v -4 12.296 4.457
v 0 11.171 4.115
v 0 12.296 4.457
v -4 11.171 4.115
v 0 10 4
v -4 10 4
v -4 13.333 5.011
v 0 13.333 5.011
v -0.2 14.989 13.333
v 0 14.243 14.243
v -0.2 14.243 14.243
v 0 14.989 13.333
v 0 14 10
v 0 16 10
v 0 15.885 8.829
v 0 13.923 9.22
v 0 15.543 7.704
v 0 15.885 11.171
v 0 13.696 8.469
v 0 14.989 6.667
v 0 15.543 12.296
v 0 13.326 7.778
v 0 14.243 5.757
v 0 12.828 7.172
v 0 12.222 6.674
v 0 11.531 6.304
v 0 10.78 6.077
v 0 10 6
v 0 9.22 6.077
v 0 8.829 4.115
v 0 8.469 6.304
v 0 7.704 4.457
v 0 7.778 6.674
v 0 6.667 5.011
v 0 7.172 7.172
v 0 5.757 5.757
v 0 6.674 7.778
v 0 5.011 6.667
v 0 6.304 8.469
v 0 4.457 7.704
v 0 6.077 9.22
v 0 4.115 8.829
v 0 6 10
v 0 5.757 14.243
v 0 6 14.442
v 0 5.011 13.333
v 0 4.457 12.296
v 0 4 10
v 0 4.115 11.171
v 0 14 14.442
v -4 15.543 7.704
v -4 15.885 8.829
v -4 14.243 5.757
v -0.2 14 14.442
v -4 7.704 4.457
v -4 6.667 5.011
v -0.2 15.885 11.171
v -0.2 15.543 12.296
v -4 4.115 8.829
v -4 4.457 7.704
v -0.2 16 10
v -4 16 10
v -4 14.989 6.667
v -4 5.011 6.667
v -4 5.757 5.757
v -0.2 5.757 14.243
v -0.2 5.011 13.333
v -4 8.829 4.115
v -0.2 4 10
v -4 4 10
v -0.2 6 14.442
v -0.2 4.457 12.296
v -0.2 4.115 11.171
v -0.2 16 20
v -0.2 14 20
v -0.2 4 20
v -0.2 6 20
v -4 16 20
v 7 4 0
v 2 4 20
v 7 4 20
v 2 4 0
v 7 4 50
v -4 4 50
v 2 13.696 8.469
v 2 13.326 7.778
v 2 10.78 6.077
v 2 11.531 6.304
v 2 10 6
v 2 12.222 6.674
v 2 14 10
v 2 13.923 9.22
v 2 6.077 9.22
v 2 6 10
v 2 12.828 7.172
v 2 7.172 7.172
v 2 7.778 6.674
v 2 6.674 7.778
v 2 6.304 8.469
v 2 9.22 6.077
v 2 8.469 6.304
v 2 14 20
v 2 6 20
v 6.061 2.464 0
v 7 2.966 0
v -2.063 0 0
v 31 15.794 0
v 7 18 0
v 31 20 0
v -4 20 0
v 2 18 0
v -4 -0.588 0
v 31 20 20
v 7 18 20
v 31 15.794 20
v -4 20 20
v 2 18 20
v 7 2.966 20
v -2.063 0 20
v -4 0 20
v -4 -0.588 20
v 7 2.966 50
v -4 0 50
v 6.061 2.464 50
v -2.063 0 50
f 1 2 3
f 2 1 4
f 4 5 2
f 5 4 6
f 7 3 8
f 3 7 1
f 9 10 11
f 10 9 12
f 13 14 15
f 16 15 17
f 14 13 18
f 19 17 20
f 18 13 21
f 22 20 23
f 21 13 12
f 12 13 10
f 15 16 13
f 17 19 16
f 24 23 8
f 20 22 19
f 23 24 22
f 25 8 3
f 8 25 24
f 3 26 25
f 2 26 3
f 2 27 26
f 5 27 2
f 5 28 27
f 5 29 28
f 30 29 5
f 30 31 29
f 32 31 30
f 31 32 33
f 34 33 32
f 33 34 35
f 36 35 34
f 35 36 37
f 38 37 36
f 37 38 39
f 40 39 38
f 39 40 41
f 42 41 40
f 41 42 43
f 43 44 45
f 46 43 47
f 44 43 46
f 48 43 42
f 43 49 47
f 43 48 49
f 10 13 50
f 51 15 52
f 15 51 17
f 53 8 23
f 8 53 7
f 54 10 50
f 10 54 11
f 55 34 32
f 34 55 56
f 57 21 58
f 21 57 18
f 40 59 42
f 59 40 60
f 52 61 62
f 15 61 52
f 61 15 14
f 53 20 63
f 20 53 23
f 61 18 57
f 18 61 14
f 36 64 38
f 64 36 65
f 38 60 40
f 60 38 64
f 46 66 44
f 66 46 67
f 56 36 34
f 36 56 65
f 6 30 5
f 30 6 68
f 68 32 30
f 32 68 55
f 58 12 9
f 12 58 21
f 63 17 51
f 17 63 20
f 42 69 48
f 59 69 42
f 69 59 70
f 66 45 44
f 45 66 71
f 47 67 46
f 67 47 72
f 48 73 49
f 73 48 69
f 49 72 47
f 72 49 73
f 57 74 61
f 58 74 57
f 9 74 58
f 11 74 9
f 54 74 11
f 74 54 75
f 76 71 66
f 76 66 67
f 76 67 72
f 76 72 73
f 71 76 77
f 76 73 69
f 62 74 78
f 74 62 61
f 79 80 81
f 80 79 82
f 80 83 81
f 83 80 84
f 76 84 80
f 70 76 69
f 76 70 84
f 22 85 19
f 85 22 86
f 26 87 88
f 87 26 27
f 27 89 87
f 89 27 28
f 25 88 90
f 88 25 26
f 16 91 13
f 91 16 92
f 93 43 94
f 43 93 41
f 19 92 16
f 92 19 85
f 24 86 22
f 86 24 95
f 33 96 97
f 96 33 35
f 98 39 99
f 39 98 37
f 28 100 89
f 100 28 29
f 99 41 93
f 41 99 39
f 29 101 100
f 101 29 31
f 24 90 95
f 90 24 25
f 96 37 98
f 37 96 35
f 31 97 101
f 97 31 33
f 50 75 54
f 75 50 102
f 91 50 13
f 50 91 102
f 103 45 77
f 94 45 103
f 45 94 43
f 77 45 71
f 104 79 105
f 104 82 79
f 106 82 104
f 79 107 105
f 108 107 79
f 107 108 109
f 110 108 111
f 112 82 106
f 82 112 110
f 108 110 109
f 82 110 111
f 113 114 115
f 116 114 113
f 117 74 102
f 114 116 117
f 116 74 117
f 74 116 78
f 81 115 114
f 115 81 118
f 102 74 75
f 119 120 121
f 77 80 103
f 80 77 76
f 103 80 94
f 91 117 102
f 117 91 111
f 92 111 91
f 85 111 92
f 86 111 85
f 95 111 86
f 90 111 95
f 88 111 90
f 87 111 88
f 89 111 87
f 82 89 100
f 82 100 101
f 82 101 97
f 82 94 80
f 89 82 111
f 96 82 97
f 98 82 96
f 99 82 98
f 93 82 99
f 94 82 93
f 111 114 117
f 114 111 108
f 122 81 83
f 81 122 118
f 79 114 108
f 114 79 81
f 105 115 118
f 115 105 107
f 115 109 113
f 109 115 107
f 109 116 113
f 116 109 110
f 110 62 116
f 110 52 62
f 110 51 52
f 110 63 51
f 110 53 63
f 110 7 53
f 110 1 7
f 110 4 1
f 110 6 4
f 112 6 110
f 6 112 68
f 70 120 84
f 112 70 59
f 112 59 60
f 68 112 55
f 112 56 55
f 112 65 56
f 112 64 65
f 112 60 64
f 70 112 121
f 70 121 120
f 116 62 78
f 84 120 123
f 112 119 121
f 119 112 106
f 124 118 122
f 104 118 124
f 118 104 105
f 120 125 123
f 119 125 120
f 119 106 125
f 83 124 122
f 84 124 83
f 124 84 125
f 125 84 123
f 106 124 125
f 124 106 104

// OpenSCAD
// file: bumper_spring_block_base.scad
include <generic/lib.scad>;

use <chassis_base.scad>;

kChassisBaseDatasheet = vChassisBaseDatasheet();

function vBumperSpringBlockBaseDatasheet() =
     let(thickness=property(kChassisBaseDatasheet, "thickness"),
         seat_thickness=3 * thickness, slot_width=5, spring_travel_distance=5,
         spring_max_length=spring_travel_distance + slot_width + 2 * seat_thickness)
     [["height", 20], ["width", 20], ["depth", 35], ["thickness", thickness], ["angular_offset", 70],
      ["spring_outer_diameter", 12], ["spring_inner_diameter", 8], ["spring_lock_size", 2 * thickness],
      ["spring_seat_thickness", seat_thickness], ["spring_slot_width", slot_width],
      ["spring_travel_distance", spring_travel_distance],
      ["spring_max_length", spring_max_length]];


module mBumperSpringBlockSeatComplement() {
     datasheet = vBumperSpringBlockBaseDatasheet();
     height = property(datasheet, "height");
     width = property(datasheet, "width");
     depth = property(datasheet, "depth");
     thickness = property(datasheet, "thickness");
     angular_offset = property(datasheet, "angular_offset");

     spring_outer_diameter = property(datasheet, "spring_outer_diameter");
     spring_inner_diameter = property(datasheet, "spring_inner_diameter");
     spring_lock_size = property(datasheet, "spring_lock_size");
     spring_seat_thickness = property(datasheet, "spring_seat_thickness");
     spring_slot_width = property(datasheet, "spring_slot_width");
     spring_travel_distance = property(datasheet, "spring_travel_distance");
     spring_max_length = property(datasheet, "spring_max_length");

     base_chassis_height = property(kChassisBaseDatasheet, "base_height");

     translate([spring_seat_thickness - spring_lock_size, width/2, height/2]) {
          rotate([0, 90, 0]) {
               translate([0, 0, -(spring_max_length - spring_slot_width) - kEpsilon]) {
                    cylinder(d=spring_inner_diameter, h=spring_max_length - spring_slot_width + 2 * kEpsilon);
                    translate([-(base_chassis_height - height/2) - kEpsilon, -spring_inner_diameter/2, 0]) {
                         cube([base_chassis_height - height/2 + kEpsilon, spring_inner_diameter,
                               spring_max_length - spring_slot_width + 2 * kEpsilon]);
                    }
                    translate([0, 0, spring_seat_thickness - spring_lock_size - kEpsilon]) {
                         cylinder(d=spring_outer_diameter, h=spring_max_length - spring_slot_width - 2 * (spring_seat_thickness - spring_lock_size) + 2 * kEpsilon);
                         translate([-(base_chassis_height - height/2) - kEpsilon, -spring_outer_diameter/2, 0]) {
                              cube([base_chassis_height - height/2 + kEpsilon, spring_outer_diameter,
                                    spring_max_length - spring_slot_width - 2 * (spring_seat_thickness - spring_lock_size)]);
                         }
                    }
               }
          }
     }
}

mBumperSpringBlockSeatComplement();

module mBumperSpringBlockXSection() {
     datasheet = vBumperSpringBlockBaseDatasheet();
     height = property(datasheet, "height");
     width = property(datasheet, "width");
     depth = property(datasheet, "depth");
     thickness = property(datasheet, "thickness");
     angular_offset = property(datasheet, "angular_offset");

     spring_lock_size = property(datasheet, "spring_lock_size");
     spring_seat_thickness = property(datasheet, "spring_seat_thickness");
     spring_slot_width = property(datasheet, "spring_slot_width");
     spring_travel_distance = property(datasheet, "spring_travel_distance");
     spring_max_length = property(datasheet, "spring_max_length");

     chassis_outer_diameter = property(kChassisBaseDatasheet, "outer_diameter");
     difference() {
          translate([-spring_lock_size, width - chassis_outer_diameter/2]) {
               outline(delta=-thickness) {
                    square([depth, chassis_outer_diameter/2]);
               }
               square([spring_seat_thickness, chassis_outer_diameter/2]);
               translate([spring_slot_width + spring_seat_thickness, 0]) {
                    square([depth - spring_slot_width - spring_seat_thickness, chassis_outer_diameter/2]);
               }
               translate([-(spring_max_length - spring_slot_width - 2 * spring_seat_thickness), 0]) {
                    translate([-spring_seat_thickness, 0]) {
                         square([spring_seat_thickness, chassis_outer_diameter/2]);
                    }
               }
          }
          translate([-chassis_outer_diameter/2 * cos(angular_offset), chassis_outer_diameter/2 * sin(angular_offset)]) {
               ring(inner_radius=chassis_outer_diameter/2 - kEpsilon, outer_radius=chassis_outer_diameter);
          }
     }
}

mBumperSpringBlockXSection();
// file: chassis_base.scad
include <generic/lib.scad>;

function vChassisBaseDatasheet() =
     let(outer_diameter=300, thickness=2, inner_diameter=outer_diameter - 2 * thickness,
         base_height=100, cover_height=20, outer_height=base_height + cover_height,
         inner_height=outer_height - 2 * thickness)
     [["outer_diameter", outer_diameter], ["inner_diameter", inner_diameter],
      ["base_height", base_height], ["height", outer_height],
      ["inner_height", inner_height], ["thickness", thickness],
      ["z_offset", 20], ["fillet_radius", 5]];

module mChassisOuterVolume() {
     datasheet = vChassisBaseDatasheet();
     rounded_cylinder(diameter=property(datasheet, "outer_diameter"),
                      height=property(datasheet, "height"),
                      fillet_radius=property(datasheet, "fillet_radius"));
}

module mChassisInnerVolume() {
     datasheet = vChassisBaseDatasheet();
     translate([0, 0, property(datasheet, "thickness")]) {
          rounded_cylinder(diameter=property(datasheet, "inner_diameter"),
                           height=property(datasheet, "inner_height"),
                           fillet_radius=property(datasheet, "fillet_radius"));
     }
}

module mChassisBBox() {
     datasheet = vChassisBaseDatasheet();
     chassis_height = property(datasheet, "height");
     chassis_outer_diameter = property(datasheet, "outer_diameter");
     translate([0., 0., chassis_height/2]) {
          cube([chassis_outer_diameter, chassis_outer_diameter, chassis_height], center=true);
     }
}

module mChassisShell() {
     difference() {
          mChassisOuterVolume();
          mChassisInnerVolume();
     }
}


module mChassisBase() {

}

mChassisBase();
// main file
include <generic/lib.scad>;

use <chassis_base.scad>;
use <bumper_spring_block_base.scad>;

kChassisBaseDatasheet = vChassisBaseDatasheet();

function vBumperSpringBlock_PartA_Datasheet() =
     vBumperSpringBlockBaseDatasheet();


module mBumperSpringBlock_PartA() {
     datasheet = vBumperSpringBlock_PartA_Datasheet();
     height = property(datasheet, "height");
     width = property(datasheet, "width");
     depth = property(datasheet, "depth");
     angular_offset = property(datasheet, "angular_offset");

     spring_outer_diameter = property(datasheet, "spring_outer_diameter");
     spring_lock_size = property(datasheet, "spring_lock_size");
     spring_seat_thickness = property(datasheet, "spring_seat_thickness");
     spring_slot_width = property(datasheet, "spring_slot_width");

     chassis_outer_diameter = property(kChassisBaseDatasheet, "outer_diameter");

     module mBumperSpringBlock_PartA_XSection() {
          translate([-spring_lock_size, -spring_lock_size]) {
               intersection() {
                    translate([spring_lock_size, spring_lock_size]) mBumperSpringBlockXSection();
                    square([depth, chassis_outer_diameter/2]);
               }
          }
     }

     render() {
          difference() {
               linear_extrude(height=height) {
                    mBumperSpringBlock_PartA_XSection();
               }
               mBumperSpringBlockSeatComplement();
          }
          linear_extrude(height=50) { // bumperHeight / 2
               difference() {
                    translate([-spring_lock_size, 0]) {
                         square([spring_seat_thickness + spring_slot_width, width/2 - spring_outer_diameter/2]);
                    }
                    translate([-chassis_outer_diameter/2 * cos(angular_offset), chassis_outer_diameter/2 * sin(angular_offset)]) {
                         ring(inner_radius=chassis_outer_diameter/2 - kEpsilon, outer_radius=chassis_outer_diameter);
                    }
               }
          }
     }
}


mBumperSpringBlock_PartA();
